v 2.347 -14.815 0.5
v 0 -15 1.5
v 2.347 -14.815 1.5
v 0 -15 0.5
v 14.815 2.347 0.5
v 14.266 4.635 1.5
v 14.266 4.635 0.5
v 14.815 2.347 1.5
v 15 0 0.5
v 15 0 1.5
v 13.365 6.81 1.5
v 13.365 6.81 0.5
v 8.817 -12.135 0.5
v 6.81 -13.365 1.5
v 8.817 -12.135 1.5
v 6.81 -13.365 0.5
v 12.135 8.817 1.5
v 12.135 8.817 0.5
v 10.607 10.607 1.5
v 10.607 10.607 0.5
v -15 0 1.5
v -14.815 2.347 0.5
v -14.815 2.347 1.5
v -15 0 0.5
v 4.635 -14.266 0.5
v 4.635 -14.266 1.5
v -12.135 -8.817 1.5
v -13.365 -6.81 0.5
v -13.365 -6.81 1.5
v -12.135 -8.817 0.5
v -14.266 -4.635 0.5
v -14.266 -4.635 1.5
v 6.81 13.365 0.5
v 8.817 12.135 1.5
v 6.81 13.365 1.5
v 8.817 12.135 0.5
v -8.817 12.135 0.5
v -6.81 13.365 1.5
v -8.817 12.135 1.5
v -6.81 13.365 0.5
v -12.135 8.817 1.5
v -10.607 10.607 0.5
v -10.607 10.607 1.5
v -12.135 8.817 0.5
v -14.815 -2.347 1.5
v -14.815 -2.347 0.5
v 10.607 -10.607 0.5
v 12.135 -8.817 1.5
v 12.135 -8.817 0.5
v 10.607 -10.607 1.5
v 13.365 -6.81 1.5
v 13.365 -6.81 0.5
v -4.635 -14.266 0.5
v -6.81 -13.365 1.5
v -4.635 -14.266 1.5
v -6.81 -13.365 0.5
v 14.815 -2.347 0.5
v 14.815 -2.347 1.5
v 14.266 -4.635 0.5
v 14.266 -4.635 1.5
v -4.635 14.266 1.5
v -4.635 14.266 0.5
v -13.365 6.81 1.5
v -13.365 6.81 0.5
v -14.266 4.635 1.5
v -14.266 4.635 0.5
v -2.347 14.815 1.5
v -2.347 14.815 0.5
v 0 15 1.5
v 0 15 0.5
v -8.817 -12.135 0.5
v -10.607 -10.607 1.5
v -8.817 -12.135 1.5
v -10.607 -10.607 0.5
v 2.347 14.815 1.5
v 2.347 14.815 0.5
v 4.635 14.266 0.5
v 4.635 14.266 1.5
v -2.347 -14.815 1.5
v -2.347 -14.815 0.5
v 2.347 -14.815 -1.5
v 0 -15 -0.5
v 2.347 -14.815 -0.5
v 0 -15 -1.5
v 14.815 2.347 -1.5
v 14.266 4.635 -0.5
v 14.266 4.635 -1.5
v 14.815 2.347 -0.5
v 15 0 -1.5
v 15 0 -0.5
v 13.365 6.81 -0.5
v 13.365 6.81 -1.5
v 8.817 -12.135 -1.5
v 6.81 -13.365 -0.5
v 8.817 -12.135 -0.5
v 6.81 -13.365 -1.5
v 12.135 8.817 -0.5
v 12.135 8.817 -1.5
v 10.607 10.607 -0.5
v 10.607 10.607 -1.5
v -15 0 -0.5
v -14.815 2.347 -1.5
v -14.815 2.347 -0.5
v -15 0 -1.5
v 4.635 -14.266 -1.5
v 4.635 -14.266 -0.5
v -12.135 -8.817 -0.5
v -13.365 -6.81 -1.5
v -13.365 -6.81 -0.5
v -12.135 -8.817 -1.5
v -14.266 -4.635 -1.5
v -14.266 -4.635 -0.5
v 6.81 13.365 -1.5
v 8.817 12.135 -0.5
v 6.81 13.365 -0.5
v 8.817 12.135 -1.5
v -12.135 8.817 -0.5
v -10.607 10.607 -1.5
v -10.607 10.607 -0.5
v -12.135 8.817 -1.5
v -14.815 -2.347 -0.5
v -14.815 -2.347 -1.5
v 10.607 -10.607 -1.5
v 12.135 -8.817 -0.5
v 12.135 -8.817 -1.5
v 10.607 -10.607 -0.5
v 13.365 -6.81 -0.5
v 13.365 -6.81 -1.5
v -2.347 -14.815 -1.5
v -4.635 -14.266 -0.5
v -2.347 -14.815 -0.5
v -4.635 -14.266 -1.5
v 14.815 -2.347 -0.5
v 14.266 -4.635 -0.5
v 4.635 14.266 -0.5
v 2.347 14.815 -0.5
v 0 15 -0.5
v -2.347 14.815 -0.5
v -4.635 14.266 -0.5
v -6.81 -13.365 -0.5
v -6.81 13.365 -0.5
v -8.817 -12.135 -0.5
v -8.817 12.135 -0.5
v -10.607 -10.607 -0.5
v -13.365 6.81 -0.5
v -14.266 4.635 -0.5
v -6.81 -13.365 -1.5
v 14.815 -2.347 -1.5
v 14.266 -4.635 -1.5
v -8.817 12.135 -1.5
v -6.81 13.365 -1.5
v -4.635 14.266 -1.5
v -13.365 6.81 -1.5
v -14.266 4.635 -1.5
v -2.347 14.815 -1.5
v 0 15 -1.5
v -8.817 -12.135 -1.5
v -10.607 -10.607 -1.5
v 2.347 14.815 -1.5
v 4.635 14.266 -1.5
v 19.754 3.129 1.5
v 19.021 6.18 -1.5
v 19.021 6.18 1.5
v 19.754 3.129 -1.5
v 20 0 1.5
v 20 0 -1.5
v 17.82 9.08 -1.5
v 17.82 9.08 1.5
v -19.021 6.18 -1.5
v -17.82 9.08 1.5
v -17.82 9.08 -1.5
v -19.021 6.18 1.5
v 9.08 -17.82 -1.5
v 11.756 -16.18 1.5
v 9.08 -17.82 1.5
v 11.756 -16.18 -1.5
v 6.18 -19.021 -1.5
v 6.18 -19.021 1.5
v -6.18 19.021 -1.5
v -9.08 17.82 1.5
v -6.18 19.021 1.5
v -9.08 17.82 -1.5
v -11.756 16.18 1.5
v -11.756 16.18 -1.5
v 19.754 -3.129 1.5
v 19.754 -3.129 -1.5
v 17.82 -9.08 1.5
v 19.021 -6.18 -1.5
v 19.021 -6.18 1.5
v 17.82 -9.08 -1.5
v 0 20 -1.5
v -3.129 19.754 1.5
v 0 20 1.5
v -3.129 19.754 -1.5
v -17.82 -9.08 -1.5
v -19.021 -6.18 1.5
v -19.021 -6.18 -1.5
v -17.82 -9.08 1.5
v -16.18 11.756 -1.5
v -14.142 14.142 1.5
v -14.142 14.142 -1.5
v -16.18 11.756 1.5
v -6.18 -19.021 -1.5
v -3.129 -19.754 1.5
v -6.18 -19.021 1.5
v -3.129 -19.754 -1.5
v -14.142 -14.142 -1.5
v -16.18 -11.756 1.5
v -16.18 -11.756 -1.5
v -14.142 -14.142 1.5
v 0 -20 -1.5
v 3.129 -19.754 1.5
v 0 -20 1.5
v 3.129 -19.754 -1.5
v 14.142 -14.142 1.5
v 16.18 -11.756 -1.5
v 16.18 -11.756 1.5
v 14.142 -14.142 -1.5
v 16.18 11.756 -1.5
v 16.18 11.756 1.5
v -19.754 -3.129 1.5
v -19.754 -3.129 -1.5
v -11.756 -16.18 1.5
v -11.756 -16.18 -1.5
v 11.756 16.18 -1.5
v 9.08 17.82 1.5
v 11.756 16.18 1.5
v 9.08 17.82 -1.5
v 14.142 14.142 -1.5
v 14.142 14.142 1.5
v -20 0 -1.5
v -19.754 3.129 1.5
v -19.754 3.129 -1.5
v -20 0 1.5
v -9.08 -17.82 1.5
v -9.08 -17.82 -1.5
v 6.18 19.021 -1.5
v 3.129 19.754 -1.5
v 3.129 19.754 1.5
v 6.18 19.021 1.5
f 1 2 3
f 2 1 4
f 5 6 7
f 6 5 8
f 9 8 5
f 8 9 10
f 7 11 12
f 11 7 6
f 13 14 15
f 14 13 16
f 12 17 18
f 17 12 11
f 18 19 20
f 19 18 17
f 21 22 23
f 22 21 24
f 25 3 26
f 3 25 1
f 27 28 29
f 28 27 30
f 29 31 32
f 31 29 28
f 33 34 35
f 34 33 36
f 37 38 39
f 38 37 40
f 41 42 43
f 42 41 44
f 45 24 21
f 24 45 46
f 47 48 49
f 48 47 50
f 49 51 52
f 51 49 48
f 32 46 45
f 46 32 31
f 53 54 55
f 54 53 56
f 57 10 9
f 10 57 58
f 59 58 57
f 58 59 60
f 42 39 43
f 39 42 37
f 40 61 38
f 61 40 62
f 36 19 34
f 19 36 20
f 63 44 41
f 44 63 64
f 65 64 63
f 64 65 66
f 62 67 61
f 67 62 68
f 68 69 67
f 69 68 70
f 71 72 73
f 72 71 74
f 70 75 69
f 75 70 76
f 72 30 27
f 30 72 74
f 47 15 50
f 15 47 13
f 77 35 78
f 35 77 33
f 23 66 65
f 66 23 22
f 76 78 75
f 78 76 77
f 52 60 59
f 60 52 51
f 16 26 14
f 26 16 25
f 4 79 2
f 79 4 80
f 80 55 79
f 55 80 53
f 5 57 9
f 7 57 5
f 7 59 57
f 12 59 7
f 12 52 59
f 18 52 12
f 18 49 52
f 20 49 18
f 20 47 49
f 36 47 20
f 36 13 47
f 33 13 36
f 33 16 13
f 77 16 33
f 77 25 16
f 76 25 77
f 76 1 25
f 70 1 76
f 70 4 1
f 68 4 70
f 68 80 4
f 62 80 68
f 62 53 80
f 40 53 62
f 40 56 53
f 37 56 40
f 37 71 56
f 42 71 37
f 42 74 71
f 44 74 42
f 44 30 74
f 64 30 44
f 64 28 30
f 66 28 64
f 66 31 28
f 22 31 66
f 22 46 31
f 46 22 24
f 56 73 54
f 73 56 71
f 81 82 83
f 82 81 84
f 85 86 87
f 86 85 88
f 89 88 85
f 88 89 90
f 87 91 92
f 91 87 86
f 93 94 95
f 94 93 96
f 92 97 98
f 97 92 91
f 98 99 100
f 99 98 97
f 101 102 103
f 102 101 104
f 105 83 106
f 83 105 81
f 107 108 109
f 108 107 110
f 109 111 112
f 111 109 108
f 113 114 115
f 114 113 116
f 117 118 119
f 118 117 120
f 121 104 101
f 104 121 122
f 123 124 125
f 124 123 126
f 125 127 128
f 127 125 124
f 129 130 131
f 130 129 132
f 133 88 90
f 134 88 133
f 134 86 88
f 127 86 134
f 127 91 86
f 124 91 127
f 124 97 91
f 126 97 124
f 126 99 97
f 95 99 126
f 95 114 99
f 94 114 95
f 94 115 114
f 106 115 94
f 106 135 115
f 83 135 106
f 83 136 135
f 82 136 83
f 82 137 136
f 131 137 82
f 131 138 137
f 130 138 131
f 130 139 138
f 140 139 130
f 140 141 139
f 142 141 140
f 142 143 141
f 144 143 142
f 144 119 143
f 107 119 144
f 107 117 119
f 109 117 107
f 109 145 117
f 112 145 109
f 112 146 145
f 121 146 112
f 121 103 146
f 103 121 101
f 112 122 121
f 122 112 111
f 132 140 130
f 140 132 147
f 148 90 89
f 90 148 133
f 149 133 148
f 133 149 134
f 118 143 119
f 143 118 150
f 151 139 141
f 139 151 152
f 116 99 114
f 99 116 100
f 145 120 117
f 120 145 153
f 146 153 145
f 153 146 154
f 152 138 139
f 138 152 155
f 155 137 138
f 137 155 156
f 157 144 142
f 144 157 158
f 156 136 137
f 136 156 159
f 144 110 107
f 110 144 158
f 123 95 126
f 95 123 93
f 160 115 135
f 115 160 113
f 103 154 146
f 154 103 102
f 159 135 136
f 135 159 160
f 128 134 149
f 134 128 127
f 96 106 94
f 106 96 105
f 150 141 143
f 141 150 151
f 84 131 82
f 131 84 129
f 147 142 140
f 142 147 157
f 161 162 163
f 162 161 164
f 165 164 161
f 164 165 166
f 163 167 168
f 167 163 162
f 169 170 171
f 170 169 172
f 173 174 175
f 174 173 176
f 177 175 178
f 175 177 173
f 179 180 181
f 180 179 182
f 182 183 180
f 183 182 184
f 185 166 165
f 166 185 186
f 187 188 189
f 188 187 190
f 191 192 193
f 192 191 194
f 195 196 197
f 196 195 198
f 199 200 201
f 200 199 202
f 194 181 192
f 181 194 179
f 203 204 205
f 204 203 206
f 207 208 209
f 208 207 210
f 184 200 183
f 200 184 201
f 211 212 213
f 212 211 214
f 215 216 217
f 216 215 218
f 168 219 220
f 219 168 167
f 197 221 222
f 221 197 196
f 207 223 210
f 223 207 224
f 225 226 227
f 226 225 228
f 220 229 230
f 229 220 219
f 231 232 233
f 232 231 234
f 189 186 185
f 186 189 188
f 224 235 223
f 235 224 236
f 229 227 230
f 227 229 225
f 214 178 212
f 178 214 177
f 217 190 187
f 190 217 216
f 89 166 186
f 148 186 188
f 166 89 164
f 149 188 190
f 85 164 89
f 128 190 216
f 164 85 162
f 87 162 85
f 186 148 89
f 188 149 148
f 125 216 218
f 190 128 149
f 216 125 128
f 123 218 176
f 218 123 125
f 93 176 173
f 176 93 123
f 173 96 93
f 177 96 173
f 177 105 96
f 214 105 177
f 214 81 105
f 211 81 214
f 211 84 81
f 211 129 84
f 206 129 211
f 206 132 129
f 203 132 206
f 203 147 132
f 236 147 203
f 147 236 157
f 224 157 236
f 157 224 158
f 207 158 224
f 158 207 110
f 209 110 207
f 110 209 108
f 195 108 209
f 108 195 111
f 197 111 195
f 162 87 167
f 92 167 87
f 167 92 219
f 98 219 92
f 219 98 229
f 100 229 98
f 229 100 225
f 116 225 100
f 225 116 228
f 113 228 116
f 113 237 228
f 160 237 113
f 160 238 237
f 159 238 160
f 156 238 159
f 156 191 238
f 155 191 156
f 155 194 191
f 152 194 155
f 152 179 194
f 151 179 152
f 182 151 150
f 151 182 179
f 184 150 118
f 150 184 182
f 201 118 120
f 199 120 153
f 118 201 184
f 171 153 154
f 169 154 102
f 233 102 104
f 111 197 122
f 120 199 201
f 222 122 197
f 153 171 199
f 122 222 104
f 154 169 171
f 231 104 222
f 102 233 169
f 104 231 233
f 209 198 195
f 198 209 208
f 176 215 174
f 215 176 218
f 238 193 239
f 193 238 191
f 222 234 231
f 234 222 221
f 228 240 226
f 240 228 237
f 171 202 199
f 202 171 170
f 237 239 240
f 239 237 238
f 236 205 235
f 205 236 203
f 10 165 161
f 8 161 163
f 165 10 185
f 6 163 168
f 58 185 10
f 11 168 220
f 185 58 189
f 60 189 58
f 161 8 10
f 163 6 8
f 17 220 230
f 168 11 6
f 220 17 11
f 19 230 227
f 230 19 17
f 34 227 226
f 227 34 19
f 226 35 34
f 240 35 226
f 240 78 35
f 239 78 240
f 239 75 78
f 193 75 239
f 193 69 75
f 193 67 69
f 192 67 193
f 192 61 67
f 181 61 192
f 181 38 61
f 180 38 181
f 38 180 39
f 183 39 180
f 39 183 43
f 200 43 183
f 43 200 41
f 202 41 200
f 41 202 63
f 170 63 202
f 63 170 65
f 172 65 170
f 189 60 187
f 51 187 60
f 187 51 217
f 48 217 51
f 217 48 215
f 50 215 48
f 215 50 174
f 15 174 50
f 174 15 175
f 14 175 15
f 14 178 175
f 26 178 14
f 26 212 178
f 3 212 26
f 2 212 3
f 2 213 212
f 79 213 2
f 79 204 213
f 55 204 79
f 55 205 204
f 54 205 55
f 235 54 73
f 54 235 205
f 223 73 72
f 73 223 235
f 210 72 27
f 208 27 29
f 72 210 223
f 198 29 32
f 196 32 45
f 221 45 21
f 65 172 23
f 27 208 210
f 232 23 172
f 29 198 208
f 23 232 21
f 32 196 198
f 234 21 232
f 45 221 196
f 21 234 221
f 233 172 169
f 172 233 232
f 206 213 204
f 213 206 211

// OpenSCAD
module Coin_01(Mat = 0){

 //Color = [Main Body, Pocket] 
 
bronze = ["#CD7F32","#7b4c1e"]; 
silver = ["#c4aead","#cdc9c9"];
gold = ["#ffd700","#daa520"];

Material = [bronze,silver,gold];

difference(){
        // Coin Main Body
        color(Material[Mat][0])
        cylinder(3,20,20, center= true, $fn = 40);
        
        // Make Pocket Hole
        color(Material[Mat][1]){   
        translate([0,0,2])
        cylinder(3,15,15, center= true, $fn = 40);
             
        translate([0,0,-2])
        cylinder(3,15,15, center= true, $fn = 40);
        }

    }
}

Coin_01(Mat = 2);
